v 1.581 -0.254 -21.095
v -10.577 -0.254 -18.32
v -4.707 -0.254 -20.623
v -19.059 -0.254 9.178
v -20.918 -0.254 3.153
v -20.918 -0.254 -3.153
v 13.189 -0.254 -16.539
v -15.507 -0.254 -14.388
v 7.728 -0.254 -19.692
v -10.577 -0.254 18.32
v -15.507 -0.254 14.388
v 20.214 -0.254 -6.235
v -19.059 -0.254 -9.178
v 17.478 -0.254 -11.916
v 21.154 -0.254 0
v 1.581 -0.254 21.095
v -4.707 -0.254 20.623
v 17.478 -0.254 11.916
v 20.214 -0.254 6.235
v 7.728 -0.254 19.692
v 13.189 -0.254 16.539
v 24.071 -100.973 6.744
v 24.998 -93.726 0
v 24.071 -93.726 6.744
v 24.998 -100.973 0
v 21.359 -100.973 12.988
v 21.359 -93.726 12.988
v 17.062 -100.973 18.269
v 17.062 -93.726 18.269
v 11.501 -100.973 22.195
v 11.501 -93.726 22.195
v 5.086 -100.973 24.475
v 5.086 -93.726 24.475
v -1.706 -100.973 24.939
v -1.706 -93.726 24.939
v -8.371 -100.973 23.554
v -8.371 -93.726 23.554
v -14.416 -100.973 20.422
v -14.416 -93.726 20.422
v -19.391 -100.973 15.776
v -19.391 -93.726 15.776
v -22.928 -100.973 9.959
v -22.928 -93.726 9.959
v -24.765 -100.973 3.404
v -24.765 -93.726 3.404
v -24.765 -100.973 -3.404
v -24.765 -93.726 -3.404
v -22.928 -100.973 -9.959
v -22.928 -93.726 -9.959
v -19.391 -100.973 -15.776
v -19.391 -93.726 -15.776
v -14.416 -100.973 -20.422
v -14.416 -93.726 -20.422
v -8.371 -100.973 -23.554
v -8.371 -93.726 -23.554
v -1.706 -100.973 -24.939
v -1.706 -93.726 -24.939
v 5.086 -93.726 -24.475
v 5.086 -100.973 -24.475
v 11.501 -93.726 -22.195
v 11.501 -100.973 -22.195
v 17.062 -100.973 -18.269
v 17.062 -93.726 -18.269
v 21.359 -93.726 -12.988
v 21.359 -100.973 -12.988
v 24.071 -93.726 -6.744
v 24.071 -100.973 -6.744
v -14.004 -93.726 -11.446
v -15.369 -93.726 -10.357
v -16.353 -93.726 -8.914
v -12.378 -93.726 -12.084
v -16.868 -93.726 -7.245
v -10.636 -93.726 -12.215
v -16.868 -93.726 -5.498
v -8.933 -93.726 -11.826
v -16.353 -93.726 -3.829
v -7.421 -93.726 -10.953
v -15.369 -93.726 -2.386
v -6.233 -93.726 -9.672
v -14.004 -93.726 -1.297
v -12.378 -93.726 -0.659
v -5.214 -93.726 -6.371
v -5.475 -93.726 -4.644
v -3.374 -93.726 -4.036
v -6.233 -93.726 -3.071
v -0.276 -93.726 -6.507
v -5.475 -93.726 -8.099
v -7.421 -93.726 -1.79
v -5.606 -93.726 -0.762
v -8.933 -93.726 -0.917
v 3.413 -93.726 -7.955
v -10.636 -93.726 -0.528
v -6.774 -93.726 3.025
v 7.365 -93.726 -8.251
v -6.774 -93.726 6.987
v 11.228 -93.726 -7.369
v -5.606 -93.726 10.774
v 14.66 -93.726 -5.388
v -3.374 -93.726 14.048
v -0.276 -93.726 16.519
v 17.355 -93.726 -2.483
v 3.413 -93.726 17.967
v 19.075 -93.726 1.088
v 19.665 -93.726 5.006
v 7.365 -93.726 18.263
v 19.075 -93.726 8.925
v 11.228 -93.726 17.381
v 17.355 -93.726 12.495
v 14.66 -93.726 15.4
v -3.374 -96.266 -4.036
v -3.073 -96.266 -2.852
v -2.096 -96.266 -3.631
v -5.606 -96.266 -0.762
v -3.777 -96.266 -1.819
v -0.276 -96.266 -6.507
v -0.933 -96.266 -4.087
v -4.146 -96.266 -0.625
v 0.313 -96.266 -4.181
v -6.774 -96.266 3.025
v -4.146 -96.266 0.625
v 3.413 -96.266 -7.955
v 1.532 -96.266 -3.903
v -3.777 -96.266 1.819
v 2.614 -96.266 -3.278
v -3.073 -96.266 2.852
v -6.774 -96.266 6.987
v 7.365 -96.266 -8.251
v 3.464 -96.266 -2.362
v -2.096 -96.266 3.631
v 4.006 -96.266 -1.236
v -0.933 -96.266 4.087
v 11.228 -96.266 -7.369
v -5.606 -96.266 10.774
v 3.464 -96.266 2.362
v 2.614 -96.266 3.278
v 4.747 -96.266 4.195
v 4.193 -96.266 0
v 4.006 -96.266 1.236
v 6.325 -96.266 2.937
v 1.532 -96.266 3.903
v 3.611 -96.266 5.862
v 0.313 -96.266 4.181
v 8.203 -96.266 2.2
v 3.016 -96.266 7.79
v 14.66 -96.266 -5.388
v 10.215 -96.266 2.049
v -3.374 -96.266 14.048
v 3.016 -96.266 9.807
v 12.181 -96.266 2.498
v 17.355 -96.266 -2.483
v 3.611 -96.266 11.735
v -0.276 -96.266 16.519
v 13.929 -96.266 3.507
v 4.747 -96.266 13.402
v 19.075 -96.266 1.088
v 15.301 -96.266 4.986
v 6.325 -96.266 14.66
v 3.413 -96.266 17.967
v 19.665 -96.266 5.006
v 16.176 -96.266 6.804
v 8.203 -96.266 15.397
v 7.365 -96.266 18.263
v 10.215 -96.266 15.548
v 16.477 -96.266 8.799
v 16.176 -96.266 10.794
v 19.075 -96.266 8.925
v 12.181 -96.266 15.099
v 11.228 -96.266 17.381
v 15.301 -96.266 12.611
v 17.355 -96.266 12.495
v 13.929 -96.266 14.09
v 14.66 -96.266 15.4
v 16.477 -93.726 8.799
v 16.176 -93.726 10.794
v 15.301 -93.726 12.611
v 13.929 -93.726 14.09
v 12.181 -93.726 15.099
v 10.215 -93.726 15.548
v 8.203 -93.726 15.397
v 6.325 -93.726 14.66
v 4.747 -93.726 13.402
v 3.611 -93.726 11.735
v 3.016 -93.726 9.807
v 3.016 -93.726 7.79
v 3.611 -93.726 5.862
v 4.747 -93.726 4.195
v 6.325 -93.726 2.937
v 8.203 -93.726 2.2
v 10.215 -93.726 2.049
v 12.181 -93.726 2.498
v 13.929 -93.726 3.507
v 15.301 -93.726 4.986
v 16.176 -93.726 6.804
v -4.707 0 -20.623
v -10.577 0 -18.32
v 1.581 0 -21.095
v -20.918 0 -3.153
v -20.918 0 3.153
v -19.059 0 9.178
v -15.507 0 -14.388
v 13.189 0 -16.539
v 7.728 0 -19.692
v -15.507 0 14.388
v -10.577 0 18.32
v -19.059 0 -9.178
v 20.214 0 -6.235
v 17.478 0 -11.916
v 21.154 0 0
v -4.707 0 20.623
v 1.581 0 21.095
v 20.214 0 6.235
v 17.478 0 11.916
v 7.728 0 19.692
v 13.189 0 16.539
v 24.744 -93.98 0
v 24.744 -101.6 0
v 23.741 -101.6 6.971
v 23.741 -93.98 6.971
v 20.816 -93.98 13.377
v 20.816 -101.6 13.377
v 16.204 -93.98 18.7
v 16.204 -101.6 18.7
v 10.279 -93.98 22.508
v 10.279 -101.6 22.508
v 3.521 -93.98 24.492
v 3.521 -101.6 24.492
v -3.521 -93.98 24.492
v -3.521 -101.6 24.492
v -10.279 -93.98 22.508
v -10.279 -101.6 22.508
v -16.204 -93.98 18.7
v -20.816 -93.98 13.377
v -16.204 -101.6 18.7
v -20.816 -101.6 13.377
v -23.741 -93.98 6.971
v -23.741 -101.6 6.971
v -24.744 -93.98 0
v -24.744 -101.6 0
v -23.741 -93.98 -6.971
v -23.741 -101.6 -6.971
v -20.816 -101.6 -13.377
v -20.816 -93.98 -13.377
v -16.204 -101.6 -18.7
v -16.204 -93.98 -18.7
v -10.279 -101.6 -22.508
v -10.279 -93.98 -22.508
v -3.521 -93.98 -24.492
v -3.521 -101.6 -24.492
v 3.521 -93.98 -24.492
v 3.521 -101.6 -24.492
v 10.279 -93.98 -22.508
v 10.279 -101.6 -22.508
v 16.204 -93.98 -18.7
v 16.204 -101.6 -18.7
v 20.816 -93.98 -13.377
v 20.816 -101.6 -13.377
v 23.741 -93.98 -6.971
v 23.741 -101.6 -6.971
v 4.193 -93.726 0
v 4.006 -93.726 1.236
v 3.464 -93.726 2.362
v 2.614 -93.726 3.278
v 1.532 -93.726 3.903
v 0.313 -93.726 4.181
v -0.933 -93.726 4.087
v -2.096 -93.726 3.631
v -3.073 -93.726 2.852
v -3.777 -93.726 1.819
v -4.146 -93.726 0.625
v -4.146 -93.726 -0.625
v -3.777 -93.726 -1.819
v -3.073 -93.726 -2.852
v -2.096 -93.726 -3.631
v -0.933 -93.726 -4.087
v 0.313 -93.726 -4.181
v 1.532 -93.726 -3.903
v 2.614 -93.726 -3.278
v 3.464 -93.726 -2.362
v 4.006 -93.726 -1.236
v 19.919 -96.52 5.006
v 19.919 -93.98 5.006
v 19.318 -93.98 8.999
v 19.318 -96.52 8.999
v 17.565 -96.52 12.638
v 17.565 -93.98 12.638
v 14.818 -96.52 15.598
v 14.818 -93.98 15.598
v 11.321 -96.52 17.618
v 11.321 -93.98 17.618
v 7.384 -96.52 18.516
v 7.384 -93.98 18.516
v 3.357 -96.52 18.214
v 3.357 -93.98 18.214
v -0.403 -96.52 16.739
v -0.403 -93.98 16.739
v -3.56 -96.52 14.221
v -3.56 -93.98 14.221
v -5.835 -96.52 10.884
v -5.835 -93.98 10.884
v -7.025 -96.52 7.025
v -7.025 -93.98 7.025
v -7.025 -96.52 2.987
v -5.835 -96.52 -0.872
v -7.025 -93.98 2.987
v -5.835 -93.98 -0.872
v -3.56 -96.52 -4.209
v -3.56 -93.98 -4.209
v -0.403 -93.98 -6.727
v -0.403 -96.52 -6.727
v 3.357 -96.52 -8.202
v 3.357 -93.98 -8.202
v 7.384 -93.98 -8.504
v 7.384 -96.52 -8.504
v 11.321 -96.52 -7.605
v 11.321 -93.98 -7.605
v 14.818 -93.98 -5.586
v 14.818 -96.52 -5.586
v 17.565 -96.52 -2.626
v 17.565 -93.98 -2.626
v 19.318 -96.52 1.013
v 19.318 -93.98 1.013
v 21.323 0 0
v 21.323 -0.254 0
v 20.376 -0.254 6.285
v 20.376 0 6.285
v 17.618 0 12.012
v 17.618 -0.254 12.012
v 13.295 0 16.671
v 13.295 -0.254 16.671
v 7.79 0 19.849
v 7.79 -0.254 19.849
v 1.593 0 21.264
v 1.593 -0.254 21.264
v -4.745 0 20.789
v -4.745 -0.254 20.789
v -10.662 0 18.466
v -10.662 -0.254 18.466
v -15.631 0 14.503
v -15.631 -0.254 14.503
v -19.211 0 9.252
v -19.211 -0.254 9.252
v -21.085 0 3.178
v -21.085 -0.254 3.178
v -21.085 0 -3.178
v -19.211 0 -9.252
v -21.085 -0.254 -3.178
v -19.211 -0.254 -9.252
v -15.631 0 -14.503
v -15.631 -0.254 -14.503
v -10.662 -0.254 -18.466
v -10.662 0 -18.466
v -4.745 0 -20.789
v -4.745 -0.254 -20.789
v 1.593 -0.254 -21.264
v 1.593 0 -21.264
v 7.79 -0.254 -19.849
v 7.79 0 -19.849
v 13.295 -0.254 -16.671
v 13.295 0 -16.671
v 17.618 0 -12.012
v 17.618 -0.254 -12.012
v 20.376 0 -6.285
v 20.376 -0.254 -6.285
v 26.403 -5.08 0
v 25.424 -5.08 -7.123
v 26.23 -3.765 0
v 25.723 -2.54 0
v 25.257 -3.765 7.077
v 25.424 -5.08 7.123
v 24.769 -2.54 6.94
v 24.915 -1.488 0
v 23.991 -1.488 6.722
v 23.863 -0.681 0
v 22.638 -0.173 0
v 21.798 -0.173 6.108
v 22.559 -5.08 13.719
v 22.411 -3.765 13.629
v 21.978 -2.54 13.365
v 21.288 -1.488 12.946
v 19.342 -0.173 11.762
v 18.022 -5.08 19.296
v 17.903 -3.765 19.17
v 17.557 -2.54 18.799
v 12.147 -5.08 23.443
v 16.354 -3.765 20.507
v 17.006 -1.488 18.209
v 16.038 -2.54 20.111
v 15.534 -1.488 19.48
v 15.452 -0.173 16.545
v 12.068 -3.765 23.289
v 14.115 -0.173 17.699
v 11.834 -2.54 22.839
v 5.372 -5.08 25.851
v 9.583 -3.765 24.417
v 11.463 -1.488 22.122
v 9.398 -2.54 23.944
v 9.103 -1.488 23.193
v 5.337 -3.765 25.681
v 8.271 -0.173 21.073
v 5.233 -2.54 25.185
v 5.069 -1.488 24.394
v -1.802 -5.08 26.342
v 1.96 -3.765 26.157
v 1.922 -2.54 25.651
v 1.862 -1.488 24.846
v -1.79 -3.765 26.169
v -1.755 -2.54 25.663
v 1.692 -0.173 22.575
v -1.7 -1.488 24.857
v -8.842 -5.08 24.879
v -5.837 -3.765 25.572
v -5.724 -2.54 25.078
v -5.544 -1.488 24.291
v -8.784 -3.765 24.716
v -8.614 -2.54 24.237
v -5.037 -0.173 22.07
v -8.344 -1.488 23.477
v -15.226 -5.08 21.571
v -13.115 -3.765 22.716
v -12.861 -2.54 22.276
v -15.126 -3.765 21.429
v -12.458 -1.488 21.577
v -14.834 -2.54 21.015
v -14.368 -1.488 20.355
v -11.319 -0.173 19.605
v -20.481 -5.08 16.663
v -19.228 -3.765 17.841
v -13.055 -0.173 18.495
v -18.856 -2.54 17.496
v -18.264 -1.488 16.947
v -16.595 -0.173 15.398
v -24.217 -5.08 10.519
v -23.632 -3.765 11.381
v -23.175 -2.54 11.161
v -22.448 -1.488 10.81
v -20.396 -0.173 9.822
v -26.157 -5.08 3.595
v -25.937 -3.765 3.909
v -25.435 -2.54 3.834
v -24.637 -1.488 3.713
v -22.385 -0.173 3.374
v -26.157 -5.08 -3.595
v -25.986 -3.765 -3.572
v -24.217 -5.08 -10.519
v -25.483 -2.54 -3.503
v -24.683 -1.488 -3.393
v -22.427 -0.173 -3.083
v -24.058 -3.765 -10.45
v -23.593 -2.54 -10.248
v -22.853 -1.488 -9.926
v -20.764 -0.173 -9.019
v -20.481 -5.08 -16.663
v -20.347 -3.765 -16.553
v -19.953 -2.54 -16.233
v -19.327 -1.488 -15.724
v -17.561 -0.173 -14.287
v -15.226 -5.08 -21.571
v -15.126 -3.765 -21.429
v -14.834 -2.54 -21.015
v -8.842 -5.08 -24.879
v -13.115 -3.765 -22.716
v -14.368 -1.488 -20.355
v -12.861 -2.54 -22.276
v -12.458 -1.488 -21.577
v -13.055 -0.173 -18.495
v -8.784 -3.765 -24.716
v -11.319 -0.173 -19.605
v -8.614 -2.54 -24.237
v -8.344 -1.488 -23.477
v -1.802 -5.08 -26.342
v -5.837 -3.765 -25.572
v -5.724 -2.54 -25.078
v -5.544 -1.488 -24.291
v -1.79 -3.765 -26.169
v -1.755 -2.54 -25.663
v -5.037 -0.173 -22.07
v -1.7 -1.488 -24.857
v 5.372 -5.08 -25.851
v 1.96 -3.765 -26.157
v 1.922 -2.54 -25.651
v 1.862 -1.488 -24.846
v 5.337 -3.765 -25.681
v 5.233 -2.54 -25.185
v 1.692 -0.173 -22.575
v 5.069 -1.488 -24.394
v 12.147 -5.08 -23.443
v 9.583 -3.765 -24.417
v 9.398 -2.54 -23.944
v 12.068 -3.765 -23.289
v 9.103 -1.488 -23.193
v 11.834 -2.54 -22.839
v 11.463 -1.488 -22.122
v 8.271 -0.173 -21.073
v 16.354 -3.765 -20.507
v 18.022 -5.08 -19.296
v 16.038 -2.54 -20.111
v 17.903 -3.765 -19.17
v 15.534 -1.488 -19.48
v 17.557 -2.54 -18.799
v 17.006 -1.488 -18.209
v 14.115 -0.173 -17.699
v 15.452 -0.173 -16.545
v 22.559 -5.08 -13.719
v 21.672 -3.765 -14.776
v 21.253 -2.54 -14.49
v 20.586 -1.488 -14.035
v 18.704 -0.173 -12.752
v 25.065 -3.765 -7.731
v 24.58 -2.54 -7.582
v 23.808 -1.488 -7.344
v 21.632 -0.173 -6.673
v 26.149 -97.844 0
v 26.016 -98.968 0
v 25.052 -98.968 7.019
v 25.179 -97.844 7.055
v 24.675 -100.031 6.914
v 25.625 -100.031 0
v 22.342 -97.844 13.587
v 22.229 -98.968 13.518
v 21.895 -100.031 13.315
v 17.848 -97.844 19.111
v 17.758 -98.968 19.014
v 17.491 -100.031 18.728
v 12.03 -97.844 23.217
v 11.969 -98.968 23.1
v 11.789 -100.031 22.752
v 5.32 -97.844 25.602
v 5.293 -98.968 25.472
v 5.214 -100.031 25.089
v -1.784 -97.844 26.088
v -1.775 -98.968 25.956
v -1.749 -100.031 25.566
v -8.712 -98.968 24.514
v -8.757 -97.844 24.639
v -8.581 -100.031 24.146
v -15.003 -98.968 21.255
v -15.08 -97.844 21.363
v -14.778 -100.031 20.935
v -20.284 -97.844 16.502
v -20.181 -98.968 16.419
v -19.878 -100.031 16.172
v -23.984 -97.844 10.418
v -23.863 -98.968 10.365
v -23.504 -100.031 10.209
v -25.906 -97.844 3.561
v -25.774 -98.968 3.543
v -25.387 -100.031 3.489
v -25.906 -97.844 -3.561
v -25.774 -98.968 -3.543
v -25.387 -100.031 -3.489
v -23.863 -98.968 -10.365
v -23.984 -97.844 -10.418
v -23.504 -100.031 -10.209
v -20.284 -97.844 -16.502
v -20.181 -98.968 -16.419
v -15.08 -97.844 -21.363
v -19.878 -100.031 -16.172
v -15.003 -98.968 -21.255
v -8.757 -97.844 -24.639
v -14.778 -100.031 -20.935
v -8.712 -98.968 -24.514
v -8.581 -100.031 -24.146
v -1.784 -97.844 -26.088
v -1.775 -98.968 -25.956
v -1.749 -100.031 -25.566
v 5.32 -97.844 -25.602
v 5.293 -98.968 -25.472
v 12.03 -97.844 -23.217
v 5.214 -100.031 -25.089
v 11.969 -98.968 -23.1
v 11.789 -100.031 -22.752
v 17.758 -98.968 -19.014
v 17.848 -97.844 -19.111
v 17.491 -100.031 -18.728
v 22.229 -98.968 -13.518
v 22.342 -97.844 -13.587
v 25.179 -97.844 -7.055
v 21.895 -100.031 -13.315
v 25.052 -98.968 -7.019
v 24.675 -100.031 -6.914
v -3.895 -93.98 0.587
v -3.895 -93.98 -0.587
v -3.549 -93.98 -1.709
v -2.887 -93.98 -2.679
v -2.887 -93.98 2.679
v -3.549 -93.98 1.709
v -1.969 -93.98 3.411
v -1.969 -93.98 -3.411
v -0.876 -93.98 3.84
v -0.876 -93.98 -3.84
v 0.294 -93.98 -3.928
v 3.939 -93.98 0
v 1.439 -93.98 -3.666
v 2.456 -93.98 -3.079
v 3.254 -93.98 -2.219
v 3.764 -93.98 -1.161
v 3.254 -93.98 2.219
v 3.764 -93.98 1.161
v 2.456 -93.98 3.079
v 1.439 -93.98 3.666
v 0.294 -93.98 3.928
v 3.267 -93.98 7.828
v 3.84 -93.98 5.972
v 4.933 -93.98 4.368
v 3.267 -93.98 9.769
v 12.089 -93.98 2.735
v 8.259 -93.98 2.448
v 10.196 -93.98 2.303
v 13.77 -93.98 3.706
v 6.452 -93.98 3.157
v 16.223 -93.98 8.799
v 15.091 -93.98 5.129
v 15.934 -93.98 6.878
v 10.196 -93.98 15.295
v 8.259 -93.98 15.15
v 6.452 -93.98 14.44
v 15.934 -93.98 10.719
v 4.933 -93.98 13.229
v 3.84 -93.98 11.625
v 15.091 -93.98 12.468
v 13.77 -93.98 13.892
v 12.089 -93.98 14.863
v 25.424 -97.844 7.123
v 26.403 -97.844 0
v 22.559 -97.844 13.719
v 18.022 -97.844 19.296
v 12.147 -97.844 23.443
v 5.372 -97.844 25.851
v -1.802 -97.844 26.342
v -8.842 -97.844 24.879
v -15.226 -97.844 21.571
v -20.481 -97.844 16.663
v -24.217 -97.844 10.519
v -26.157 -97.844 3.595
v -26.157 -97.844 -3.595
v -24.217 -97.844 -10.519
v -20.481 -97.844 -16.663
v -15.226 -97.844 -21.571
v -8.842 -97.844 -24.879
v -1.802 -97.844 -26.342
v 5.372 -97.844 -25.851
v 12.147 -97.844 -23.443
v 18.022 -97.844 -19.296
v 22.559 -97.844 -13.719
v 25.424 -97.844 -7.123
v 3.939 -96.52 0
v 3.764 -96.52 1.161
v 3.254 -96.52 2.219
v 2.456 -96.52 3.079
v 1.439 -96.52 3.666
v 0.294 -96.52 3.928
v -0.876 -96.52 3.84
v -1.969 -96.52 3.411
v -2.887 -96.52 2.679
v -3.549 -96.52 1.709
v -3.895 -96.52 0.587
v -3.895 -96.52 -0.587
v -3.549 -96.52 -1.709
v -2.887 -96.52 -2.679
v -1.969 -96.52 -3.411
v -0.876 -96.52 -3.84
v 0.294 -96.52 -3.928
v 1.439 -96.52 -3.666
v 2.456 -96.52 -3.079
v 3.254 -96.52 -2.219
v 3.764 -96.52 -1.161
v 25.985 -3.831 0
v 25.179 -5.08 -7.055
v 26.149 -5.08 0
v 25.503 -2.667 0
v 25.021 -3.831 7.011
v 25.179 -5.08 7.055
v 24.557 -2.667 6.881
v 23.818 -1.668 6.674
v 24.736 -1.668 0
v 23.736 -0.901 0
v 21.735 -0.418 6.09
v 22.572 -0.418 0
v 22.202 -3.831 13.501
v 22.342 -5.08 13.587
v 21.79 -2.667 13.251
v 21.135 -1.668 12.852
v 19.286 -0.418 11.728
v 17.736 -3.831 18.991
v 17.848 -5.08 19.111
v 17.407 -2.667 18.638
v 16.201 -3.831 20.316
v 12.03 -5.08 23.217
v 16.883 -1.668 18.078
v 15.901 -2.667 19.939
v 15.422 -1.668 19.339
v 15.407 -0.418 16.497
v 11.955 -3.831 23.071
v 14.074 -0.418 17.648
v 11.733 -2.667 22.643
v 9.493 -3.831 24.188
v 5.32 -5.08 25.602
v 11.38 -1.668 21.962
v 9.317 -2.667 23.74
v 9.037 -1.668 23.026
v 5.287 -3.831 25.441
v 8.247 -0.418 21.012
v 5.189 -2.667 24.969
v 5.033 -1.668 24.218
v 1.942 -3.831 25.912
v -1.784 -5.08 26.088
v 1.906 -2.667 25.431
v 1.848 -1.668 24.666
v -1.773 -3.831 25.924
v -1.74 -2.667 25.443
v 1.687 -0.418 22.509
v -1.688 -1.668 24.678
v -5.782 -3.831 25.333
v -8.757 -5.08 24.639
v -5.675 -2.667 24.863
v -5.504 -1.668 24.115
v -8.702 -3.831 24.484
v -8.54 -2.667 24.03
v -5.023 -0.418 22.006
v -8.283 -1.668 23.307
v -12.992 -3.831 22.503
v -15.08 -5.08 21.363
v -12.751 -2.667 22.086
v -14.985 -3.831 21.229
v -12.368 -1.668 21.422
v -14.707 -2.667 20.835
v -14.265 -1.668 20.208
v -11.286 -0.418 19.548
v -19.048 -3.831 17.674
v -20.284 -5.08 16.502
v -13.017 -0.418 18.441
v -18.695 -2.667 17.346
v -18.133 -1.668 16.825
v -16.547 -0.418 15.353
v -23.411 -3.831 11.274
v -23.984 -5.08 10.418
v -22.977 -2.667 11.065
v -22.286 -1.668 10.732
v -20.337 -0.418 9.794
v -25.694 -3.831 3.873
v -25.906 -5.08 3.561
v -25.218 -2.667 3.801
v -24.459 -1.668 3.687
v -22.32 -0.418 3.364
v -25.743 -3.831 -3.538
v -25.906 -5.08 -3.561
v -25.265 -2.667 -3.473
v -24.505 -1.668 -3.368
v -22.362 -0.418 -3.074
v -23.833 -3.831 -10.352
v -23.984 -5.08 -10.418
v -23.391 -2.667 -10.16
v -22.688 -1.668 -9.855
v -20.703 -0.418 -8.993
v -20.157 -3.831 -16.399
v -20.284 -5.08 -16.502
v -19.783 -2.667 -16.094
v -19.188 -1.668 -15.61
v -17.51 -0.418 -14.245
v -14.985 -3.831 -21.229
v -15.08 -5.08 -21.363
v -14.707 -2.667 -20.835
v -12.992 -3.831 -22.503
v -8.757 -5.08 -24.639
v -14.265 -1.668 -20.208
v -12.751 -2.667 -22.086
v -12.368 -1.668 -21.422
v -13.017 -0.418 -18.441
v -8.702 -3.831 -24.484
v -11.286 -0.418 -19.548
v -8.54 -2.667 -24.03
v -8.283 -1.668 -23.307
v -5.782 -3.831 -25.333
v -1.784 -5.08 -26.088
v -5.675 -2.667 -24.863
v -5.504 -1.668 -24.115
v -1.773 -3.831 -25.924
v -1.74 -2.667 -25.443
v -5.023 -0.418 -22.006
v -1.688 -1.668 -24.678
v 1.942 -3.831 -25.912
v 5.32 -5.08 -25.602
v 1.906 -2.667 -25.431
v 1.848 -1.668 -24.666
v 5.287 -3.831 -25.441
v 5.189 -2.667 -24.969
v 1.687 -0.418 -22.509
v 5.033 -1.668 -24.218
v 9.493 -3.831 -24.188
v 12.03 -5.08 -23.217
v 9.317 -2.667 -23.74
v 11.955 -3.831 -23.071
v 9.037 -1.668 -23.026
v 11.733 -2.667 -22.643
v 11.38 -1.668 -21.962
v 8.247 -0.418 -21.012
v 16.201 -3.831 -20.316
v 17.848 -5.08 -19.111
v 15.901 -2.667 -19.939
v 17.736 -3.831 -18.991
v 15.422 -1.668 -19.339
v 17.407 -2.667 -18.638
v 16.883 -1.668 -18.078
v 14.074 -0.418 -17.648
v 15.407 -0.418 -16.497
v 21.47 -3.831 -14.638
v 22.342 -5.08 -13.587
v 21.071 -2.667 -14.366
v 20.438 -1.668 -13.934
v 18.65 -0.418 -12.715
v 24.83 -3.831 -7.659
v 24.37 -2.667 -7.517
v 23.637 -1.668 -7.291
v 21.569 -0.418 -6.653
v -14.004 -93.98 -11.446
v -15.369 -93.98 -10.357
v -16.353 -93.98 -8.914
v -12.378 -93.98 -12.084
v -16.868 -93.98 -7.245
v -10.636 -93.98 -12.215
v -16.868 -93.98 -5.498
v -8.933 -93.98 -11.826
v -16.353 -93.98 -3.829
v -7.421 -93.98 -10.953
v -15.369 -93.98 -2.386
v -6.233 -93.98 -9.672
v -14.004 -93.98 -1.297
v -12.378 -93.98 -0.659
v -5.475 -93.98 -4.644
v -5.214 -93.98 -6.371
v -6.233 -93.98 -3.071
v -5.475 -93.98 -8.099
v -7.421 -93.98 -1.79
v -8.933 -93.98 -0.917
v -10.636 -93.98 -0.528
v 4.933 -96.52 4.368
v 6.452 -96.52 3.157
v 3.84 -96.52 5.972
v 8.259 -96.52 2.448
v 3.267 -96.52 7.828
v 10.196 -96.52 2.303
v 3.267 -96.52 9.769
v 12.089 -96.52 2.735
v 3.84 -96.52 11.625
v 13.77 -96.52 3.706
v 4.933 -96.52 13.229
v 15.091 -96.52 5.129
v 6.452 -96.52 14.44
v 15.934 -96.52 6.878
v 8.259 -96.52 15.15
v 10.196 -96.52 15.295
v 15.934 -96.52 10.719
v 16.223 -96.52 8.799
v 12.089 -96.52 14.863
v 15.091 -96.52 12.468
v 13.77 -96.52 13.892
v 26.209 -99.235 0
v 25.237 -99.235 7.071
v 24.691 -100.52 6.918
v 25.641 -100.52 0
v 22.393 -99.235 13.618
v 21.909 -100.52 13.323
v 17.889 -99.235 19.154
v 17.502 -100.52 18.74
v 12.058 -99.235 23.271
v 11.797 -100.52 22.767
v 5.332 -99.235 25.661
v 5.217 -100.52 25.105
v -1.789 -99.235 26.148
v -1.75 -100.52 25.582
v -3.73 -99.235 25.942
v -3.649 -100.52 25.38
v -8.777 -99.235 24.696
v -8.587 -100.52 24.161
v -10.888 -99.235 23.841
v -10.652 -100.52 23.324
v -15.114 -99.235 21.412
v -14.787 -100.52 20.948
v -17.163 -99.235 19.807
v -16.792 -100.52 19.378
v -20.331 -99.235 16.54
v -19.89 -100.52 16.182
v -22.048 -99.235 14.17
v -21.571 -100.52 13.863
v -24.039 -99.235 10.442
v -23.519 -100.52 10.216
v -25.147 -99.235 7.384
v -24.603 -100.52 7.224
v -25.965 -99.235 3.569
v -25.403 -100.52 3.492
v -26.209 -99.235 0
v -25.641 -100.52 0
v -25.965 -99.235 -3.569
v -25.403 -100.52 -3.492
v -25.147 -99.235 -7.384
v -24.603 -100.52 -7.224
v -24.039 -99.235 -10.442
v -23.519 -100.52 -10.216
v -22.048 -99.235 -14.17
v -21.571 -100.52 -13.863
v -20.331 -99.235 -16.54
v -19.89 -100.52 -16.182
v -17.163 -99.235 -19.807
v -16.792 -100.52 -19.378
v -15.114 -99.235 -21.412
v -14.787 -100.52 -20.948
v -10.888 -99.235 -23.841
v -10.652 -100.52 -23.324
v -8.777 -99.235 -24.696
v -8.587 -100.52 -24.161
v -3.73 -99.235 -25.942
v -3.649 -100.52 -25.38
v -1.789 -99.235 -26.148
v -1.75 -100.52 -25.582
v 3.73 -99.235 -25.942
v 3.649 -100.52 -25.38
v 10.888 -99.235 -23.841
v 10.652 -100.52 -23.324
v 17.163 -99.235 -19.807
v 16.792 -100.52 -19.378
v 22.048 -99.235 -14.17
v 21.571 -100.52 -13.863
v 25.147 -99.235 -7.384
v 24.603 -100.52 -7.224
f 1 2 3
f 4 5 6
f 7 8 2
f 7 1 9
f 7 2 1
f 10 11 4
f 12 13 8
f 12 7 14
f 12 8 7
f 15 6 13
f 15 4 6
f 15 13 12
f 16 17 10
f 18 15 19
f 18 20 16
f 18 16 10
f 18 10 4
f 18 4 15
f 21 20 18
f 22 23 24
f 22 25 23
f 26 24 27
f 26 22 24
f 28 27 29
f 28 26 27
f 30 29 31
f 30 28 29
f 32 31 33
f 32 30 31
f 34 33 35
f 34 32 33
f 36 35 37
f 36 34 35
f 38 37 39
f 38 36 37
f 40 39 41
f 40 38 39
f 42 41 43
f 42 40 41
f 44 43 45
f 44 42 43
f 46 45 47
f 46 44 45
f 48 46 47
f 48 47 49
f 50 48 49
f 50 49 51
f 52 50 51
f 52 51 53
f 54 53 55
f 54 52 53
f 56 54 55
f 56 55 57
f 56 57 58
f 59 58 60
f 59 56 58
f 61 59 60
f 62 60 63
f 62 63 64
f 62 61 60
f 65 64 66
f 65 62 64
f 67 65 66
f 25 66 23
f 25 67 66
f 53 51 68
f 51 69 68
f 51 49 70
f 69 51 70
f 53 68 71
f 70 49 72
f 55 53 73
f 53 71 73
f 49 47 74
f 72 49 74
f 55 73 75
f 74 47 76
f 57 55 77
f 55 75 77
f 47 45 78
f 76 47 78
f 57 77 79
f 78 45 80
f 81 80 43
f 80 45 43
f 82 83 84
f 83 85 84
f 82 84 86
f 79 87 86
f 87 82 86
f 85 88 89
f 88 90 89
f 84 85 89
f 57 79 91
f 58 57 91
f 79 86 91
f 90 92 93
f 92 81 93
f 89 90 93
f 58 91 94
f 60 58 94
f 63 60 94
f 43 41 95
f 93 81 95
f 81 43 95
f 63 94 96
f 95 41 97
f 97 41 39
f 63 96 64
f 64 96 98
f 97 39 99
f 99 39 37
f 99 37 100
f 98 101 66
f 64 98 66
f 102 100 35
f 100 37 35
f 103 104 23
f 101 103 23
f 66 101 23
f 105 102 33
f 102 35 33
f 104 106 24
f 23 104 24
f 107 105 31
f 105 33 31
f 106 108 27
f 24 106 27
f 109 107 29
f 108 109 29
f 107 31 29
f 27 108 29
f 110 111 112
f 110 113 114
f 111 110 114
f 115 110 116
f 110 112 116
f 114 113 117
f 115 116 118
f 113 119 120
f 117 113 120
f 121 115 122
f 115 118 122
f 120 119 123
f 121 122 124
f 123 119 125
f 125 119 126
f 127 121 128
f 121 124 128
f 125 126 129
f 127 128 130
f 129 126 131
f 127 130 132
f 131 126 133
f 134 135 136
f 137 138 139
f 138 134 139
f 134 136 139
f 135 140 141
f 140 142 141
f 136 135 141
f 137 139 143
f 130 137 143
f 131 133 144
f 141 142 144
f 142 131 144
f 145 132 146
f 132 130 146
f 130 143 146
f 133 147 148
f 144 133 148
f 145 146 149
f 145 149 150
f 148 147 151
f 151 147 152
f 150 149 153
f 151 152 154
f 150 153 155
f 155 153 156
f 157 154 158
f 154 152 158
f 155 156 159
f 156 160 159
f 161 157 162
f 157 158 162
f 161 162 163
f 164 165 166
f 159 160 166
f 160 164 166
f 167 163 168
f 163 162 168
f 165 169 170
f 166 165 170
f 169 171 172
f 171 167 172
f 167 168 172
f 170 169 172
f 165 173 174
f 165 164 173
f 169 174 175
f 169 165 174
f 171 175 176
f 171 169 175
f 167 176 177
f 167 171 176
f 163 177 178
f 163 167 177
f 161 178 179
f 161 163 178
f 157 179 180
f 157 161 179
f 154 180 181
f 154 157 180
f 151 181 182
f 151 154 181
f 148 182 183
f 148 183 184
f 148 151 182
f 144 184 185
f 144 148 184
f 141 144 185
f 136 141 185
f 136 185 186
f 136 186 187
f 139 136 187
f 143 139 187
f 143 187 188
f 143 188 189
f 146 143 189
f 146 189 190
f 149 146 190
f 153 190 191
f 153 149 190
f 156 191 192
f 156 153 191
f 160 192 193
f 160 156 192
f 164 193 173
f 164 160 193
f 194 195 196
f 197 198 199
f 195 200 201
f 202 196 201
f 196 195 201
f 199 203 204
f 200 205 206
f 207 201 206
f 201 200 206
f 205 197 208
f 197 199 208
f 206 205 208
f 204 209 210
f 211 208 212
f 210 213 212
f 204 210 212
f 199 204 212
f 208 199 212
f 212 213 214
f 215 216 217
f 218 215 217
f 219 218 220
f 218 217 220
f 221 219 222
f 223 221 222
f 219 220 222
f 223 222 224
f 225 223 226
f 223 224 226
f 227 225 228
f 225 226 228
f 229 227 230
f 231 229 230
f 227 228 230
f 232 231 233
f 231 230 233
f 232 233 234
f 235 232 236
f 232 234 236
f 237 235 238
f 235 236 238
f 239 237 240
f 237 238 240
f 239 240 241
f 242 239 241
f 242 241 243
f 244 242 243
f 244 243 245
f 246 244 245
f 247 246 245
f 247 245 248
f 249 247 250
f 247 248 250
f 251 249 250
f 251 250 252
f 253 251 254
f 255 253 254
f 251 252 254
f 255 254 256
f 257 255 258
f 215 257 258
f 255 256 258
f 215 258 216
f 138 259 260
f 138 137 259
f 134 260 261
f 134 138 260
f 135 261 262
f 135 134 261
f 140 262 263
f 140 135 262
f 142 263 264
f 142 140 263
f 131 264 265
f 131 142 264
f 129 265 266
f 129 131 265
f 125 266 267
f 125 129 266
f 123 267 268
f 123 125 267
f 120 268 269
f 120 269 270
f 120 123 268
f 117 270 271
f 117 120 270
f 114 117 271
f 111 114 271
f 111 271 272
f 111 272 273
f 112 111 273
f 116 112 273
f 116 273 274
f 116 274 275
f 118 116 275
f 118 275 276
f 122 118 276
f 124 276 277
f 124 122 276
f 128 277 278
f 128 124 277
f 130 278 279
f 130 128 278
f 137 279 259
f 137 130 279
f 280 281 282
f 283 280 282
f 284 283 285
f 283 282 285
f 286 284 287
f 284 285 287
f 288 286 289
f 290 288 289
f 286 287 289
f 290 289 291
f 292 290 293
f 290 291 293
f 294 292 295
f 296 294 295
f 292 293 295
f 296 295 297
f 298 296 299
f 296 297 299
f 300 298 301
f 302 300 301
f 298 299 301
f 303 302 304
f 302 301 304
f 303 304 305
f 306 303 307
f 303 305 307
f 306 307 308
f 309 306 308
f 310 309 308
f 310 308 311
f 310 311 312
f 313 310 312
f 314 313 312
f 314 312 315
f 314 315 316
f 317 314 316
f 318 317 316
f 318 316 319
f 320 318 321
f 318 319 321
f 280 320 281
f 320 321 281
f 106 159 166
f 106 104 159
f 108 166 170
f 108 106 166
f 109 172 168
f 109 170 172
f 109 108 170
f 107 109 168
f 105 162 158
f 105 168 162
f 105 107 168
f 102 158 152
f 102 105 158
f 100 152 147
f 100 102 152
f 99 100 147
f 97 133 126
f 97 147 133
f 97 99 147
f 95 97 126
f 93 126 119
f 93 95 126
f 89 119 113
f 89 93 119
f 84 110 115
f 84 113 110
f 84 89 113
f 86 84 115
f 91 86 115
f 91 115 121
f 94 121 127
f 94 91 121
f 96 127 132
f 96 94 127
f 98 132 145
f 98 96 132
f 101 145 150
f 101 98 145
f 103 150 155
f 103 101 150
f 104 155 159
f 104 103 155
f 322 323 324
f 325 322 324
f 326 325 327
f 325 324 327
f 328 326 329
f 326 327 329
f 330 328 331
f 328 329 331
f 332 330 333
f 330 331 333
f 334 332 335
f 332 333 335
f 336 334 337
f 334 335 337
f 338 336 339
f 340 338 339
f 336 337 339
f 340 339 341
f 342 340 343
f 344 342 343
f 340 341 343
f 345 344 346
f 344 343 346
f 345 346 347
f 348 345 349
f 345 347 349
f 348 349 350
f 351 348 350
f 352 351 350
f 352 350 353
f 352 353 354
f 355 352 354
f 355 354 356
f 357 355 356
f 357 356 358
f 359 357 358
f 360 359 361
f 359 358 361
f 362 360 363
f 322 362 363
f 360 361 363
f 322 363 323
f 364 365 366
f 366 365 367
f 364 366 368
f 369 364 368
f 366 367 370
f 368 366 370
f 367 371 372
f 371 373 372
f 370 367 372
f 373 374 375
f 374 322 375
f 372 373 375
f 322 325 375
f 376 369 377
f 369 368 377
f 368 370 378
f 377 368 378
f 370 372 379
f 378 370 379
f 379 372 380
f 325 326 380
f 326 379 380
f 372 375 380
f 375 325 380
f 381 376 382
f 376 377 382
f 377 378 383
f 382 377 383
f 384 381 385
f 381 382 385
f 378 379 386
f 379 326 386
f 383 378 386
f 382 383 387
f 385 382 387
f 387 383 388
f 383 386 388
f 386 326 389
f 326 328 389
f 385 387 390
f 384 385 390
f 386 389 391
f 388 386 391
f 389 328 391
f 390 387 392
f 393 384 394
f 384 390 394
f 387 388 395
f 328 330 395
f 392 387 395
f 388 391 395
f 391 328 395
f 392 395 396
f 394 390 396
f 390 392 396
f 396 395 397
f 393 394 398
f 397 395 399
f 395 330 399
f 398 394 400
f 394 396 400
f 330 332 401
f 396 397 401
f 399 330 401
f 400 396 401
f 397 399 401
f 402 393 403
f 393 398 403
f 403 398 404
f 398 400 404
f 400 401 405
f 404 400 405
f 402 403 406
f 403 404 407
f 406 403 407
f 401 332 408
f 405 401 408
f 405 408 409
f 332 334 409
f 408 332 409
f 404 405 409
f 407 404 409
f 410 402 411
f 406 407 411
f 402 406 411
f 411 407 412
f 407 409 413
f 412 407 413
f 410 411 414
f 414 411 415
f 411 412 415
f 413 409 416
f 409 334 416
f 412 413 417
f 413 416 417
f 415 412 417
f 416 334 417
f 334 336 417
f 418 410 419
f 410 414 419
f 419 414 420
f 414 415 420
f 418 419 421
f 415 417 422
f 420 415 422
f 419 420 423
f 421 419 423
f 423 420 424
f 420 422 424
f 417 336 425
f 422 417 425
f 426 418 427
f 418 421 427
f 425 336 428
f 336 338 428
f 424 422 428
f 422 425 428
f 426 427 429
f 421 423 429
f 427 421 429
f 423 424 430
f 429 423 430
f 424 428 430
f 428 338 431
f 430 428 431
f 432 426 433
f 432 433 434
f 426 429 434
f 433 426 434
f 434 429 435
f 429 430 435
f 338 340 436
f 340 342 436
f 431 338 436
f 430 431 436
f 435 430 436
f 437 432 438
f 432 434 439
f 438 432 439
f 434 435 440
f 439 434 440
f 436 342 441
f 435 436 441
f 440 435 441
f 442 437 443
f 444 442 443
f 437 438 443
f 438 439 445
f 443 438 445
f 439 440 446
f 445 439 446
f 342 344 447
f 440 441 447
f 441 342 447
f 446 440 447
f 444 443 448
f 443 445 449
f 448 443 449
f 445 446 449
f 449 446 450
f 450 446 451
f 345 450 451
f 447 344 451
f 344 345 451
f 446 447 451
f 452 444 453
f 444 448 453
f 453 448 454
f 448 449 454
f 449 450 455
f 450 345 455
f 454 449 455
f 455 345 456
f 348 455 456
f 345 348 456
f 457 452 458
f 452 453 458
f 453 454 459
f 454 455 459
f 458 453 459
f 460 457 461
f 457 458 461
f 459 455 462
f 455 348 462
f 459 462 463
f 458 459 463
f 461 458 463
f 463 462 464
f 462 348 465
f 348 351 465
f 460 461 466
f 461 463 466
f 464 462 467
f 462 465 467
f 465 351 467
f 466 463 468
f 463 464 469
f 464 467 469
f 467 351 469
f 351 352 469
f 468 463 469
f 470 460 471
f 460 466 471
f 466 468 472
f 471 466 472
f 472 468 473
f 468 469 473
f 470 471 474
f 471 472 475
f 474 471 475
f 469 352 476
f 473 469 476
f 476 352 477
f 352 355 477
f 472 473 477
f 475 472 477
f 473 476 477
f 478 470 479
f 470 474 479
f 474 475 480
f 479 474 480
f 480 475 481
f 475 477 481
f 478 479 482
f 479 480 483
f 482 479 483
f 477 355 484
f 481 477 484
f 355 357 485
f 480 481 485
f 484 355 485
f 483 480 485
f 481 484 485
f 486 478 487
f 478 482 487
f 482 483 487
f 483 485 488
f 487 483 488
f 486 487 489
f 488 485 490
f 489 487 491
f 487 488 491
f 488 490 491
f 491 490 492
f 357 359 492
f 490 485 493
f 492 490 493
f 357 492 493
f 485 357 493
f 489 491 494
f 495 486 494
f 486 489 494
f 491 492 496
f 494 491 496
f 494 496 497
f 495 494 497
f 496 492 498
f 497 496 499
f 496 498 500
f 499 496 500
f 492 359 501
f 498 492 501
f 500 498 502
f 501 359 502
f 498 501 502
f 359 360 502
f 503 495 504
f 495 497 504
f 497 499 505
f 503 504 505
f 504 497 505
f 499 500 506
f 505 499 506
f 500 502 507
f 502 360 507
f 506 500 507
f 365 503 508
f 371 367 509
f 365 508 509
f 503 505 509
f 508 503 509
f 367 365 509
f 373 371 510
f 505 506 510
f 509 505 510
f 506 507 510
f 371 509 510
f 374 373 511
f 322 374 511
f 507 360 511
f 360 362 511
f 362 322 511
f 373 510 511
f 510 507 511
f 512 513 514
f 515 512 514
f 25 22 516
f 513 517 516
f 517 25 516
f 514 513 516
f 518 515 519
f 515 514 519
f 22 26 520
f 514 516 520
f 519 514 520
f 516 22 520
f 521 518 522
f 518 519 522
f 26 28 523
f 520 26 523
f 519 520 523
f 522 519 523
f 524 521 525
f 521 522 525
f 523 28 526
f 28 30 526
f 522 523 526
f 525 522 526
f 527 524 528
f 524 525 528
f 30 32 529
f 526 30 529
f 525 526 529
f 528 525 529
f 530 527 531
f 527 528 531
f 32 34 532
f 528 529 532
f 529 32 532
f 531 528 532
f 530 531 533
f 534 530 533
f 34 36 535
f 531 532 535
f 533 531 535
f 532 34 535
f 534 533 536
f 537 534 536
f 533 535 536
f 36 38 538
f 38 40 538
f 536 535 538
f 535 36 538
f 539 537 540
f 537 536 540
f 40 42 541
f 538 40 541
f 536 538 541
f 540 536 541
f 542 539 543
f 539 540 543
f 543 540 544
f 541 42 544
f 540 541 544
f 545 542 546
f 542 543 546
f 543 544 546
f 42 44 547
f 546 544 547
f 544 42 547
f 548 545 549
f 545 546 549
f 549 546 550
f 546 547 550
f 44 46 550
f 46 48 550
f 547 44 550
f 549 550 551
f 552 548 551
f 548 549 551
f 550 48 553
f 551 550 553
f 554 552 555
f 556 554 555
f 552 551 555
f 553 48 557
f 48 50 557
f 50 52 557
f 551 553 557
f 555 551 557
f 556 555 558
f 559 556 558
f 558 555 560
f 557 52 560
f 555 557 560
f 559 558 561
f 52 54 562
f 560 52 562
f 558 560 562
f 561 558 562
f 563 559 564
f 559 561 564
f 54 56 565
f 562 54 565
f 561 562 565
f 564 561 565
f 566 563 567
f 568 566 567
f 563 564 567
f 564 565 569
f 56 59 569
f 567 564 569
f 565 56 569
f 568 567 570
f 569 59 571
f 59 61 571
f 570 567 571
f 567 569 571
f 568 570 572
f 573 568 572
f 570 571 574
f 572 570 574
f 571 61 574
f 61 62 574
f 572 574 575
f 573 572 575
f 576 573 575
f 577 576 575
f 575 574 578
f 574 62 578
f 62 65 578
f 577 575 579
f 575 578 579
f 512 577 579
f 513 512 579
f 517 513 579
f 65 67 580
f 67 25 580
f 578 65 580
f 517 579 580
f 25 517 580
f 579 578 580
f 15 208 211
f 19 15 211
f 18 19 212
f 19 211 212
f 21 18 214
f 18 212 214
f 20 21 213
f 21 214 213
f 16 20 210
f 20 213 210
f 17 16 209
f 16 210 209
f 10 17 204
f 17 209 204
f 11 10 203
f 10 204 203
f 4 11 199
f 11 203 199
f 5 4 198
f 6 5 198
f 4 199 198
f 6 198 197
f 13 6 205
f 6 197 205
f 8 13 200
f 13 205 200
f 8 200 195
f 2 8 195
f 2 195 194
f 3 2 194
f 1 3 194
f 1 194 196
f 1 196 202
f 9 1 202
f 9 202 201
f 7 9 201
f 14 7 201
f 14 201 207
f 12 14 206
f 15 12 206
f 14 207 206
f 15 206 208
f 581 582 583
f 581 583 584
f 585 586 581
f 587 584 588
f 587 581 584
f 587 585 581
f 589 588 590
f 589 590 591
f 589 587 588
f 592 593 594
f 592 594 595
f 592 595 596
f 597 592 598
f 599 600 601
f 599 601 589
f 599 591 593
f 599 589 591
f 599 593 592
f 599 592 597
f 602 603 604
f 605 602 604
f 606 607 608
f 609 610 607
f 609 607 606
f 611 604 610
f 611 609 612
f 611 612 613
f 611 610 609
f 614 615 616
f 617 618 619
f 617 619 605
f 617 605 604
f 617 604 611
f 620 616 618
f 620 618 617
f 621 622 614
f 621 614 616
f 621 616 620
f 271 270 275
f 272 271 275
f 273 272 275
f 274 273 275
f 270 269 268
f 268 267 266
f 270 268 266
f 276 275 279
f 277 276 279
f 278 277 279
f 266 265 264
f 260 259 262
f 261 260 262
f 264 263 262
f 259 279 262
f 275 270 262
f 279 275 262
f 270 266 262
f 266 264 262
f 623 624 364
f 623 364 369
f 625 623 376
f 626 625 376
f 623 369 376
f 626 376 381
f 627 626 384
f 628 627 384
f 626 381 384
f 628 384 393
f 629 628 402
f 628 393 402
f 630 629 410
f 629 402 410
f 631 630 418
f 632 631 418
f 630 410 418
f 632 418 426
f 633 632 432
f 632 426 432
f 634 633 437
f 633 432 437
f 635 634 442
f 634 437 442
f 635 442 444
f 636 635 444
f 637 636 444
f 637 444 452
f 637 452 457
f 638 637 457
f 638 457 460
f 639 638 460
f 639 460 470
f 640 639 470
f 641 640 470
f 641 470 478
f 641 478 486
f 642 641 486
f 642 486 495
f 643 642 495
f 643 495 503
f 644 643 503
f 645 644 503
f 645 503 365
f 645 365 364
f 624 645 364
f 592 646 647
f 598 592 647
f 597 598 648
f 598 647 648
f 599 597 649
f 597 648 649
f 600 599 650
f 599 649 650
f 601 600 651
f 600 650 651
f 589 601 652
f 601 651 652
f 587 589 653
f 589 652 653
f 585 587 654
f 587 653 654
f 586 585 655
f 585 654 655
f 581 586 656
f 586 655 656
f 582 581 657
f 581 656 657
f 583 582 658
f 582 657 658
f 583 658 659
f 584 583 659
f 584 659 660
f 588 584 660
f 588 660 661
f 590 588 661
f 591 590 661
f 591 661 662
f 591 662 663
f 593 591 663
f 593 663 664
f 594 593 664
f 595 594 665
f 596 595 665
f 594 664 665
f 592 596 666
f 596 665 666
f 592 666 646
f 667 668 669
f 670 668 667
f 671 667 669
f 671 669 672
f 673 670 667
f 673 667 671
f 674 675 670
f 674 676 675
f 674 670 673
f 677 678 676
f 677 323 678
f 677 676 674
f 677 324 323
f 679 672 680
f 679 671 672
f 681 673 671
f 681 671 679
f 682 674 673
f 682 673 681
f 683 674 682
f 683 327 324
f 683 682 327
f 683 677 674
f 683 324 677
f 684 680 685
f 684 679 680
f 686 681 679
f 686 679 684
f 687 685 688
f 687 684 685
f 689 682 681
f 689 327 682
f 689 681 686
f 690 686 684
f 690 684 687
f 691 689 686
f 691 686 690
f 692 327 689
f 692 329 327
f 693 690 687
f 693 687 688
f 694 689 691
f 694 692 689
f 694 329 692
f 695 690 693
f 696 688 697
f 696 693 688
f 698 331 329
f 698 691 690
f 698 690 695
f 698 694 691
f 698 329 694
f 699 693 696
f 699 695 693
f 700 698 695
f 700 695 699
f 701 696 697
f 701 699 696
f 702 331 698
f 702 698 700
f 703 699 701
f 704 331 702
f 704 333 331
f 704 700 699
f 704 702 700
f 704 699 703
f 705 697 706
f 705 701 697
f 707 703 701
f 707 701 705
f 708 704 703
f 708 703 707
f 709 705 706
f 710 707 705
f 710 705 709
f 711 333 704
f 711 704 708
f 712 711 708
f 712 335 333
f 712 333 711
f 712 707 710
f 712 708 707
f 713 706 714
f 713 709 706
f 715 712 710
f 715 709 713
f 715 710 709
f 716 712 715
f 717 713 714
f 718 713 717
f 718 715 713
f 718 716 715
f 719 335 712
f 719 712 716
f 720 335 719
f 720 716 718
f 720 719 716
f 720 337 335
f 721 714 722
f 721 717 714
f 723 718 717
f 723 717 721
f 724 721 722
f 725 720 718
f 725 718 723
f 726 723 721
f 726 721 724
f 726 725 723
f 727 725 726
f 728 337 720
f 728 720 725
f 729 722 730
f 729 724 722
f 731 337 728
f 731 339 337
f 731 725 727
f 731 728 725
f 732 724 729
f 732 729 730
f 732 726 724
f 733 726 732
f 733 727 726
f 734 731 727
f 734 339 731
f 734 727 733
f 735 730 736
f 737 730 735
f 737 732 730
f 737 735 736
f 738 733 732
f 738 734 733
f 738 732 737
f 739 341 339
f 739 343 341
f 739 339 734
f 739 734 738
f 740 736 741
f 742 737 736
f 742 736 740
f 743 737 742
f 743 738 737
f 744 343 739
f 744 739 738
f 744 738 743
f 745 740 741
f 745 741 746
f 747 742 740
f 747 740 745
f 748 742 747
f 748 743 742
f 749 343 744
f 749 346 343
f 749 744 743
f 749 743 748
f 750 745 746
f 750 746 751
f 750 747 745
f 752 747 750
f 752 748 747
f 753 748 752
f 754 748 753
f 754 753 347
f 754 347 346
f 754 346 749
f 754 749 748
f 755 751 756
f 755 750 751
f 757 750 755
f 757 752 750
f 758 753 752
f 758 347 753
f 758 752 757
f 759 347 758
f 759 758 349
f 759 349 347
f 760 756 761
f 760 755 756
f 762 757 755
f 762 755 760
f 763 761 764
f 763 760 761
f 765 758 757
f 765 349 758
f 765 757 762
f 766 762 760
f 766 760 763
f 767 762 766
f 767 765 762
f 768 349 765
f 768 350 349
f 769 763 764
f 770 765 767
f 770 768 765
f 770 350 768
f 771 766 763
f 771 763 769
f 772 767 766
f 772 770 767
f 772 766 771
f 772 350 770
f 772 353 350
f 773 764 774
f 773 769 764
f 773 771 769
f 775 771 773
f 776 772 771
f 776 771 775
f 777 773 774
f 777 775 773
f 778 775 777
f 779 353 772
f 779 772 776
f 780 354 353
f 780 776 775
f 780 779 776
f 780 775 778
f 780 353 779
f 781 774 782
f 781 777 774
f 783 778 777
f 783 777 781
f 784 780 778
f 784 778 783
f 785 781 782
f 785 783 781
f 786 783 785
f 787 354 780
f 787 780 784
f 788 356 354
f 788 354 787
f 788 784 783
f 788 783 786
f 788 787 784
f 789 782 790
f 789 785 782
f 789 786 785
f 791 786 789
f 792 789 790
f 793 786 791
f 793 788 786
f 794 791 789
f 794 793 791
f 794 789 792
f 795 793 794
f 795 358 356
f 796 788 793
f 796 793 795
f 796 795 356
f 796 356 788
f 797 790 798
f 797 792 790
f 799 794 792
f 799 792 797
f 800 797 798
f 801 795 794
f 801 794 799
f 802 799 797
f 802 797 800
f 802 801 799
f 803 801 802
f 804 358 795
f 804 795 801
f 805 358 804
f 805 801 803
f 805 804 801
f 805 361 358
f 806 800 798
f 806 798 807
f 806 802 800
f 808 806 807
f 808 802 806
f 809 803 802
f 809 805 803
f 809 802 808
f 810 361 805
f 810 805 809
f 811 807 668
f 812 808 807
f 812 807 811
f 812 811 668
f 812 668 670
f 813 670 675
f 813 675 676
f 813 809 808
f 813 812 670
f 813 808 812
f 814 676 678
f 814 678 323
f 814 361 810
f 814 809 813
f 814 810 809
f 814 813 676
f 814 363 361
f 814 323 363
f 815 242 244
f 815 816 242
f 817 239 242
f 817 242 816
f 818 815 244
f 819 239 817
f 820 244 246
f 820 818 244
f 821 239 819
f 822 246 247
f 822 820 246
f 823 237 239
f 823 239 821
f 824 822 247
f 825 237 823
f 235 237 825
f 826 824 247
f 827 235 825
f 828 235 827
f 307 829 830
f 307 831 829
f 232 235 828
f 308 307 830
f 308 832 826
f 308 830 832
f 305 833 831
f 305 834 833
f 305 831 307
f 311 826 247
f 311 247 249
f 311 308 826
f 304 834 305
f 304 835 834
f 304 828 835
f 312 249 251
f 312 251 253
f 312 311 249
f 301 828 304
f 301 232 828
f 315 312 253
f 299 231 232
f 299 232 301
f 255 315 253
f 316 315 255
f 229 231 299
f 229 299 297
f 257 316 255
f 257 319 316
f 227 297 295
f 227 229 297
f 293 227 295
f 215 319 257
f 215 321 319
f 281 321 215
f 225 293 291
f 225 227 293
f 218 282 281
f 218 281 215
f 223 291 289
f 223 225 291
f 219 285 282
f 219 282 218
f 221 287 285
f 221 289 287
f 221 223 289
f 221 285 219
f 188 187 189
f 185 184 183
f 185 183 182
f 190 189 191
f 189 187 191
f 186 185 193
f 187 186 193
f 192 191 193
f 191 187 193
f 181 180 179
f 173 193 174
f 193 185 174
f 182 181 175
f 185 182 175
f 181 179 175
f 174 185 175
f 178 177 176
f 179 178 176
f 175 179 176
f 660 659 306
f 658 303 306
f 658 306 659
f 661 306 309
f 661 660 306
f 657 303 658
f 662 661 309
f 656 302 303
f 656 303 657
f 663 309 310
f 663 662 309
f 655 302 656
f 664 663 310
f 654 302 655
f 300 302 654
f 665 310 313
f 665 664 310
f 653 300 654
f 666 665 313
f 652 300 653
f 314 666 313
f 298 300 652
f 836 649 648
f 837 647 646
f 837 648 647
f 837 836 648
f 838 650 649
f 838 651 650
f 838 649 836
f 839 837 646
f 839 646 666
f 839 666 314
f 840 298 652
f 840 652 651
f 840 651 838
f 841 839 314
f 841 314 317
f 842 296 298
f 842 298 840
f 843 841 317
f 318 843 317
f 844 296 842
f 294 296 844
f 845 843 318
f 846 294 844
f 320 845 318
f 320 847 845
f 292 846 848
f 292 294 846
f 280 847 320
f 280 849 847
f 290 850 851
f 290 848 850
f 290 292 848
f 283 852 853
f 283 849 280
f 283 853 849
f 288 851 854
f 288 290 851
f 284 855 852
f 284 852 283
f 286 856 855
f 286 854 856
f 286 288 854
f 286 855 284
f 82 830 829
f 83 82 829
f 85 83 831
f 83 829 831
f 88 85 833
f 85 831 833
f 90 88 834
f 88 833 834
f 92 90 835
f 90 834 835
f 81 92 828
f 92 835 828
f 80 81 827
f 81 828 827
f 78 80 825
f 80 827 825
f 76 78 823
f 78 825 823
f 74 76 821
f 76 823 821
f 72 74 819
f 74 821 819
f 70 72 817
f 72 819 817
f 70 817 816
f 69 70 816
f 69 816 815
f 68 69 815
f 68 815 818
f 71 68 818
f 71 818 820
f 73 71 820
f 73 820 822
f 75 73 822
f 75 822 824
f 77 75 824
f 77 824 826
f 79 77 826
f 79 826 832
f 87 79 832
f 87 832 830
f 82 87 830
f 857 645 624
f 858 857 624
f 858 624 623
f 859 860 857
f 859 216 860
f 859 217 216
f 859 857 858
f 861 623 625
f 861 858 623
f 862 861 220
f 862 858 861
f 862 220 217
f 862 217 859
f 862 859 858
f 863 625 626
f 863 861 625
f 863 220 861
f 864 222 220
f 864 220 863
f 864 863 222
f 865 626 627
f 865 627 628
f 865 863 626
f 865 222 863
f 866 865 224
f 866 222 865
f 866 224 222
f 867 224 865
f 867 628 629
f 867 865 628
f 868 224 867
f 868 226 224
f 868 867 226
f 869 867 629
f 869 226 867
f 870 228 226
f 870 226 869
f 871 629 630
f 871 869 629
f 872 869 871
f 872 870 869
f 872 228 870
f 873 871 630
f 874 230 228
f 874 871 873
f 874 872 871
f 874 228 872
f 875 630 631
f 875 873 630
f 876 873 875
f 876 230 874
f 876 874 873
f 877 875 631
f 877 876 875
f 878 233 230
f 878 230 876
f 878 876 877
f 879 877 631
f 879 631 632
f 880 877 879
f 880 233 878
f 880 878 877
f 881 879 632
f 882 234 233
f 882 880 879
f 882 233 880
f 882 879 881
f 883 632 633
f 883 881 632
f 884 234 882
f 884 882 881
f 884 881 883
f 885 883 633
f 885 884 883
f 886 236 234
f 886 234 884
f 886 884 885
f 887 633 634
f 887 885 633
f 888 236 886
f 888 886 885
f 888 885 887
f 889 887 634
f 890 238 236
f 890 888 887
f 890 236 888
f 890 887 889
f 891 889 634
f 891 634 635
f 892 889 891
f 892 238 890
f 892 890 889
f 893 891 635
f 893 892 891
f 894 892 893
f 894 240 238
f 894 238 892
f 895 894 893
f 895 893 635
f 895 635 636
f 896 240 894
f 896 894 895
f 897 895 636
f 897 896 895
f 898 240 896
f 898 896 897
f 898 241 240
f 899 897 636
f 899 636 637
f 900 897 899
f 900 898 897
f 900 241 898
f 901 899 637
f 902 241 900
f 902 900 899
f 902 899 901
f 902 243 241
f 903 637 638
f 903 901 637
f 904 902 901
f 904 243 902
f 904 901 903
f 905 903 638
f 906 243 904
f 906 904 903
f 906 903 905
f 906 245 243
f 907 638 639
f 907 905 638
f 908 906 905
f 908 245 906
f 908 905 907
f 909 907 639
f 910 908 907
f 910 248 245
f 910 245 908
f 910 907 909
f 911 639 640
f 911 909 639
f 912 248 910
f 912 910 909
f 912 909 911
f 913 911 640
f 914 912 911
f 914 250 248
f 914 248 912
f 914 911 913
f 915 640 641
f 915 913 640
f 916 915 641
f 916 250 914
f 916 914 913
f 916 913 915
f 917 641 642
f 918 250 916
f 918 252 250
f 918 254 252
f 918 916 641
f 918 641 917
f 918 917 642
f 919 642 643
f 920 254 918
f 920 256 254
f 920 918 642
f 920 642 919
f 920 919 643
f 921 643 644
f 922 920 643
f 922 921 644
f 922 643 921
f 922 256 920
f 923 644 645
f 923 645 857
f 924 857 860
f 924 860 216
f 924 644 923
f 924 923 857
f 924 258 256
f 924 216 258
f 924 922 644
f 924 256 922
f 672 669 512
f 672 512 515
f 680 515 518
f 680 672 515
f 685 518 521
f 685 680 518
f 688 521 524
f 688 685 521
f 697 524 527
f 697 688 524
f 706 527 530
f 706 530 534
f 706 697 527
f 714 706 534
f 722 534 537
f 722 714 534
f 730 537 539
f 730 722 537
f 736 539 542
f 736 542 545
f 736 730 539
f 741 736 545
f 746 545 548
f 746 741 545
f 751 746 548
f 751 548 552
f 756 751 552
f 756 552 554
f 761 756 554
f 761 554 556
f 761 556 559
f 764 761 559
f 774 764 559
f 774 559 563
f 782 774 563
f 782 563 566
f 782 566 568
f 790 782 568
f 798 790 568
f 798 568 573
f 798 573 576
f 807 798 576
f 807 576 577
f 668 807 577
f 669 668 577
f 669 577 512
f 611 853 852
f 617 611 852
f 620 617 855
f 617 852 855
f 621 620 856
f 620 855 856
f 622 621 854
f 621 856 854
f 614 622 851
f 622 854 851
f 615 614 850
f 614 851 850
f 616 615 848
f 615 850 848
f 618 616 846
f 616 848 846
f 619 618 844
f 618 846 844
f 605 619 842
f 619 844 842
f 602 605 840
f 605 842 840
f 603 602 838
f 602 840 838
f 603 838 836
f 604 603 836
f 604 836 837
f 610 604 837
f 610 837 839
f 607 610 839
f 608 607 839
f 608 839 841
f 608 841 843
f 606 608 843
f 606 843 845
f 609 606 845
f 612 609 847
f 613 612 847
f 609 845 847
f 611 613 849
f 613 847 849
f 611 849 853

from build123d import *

# Parameters (mm, degrees)
F0_R      = 26.403137542
F1_DEPTH  = 101.6
F2_R      = 24.74377178
F3_DEPTH  = 7.62
F5_R      = 13.5480527637
F6_DEPTH  = 2.54
F7_R      = 6.5142551247
F8_DEPTH  = 2.54
F9_R      = 3.938583422
F10_DEPTH = 2.54
F11_T     = -0.254
F12_R     = 21.153794525
F13_DEPTH = 0.254
F14_R     = 5.8596108627
F15_DEPTH = 25.4


# Not quite as in the source:
# - a fillet or chamfer that OpenCascade refuses, or shapes differently, is made with other operations: its cross-section is extruded or revolved along the edge and cut away or added
# - a shell that OpenCascade refuses in one call is made with other operations: the cavity is built on its own and cut out


with BuildPart() as f1:
    # F0 (on Front) → F1 (new body)
    with BuildSketch(Plane.XZ):
        Circle(F0_R)
    extrude(amount=F1_DEPTH)

    # F2 (on face) → F3 (cut)
    with BuildSketch(Plane.XZ.offset(101.6)):
        Circle(F2_R)
    extrude(amount=-F3_DEPTH, mode=Mode.SUBTRACT)

    # F4: fillet of radius 5.08 on 2 edges, made by hand

    # F4_s1 → F4_t2 (revolve, cut)
    with BuildSketch(Plane.XY):
        with BuildLine():
            ThreePointArc((26.403137542, -97.8442495544), (25.9698149533, -99.8972446921), (24.74377178, -101.6))
            Line((24.74377178, -101.6), (24.8121844648, -101.6751150089))
            ThreePointArc((24.8121844648, -101.6751150089), (25.573454661, -101.7016), (26.403137542, -101.7016))
            Line((26.403137542, -101.7016), (26.504737542, -101.6))
            Line((26.504737542, -101.6), (26.504737542, -97.8442495544))
            Line((26.504737542, -97.8442495544), (26.403137542, -97.8442495544))
        make_face()
    revolve(axis=Axis((0, -101.6, 0), (0, -1, 0)), mode=Mode.SUBTRACT)

    # F4_s3 → F4_t4 (revolve, cut)
    with BuildSketch(Plane.XY):
        with BuildLine():
            ThreePointArc((26.403137542, -5.08), (24.9152399905, -1.4878975516), (21.323137542, 0))
            Line((21.323137542, 0), (21.323137542, 0.1016))
            Line((21.323137542, 0.1016), (26.504737542, 0.1016))
            Line((26.504737542, 0.1016), (26.504737542, -5.08))
            Line((26.504737542, -5.08), (26.403137542, -5.08))
        make_face()
    revolve(axis=Axis((0, 0, 0), (0, -1, 0)), mode=Mode.SUBTRACT)

    # F5 (on face) → F6 (join)
    with BuildSketch(Plane.XZ.offset(93.98)):
        with Locations((6.3713835552, 5.0060865469)):
            Circle(F5_R)
    extrude(amount=F6_DEPTH)

    # F7 (on face) → F8 (cut)
    with BuildSketch(Plane.XZ.offset(96.52)):
        with Locations((9.7087752074, 8.7985796854)):
            Circle(F7_R)
    extrude(amount=-F8_DEPTH, mode=Mode.SUBTRACT)

    # F9 (on face) → F10 (cut)
    with BuildSketch(Plane.XZ.offset(96.52)):
        Circle(F9_R)
    extrude(amount=-F10_DEPTH, mode=Mode.SUBTRACT)

    # F11: a shell. OpenCascade refuses it in one call, so the cavity is built on its own and cut out:
    # the body offset inwards by the wall thickness, plus a prism from it out through each open face.
    f11_core = offset(f1.part, amount=F11_T, kind=Kind.INTERSECTION, mode=Mode.PRIVATE)
    f11_exits = [f11_core.faces().sort_by_distance(p)[0] for p in [
        (0, -0.254, 0),
    ]]
    add(f11_core, mode=Mode.SUBTRACT)
    extrude(f11_exits, amount=-F11_T, mode=Mode.SUBTRACT)

    # F14 (on face) → F15 (cut)
    with BuildSketch(Plane.XZ.offset(93.98)):
        with Locations((-11.0740670934, -6.3713807613)):
            Circle(F14_R)
    extrude(amount=-F15_DEPTH, mode=Mode.SUBTRACT)


with BuildPart() as f13:
    # F12 (on Front) → F13 (new body)
    with BuildSketch(Plane.XZ):
        Circle(F12_R)
    extrude(amount=F13_DEPTH)


solid = Compound([f1.part, f13.part])
